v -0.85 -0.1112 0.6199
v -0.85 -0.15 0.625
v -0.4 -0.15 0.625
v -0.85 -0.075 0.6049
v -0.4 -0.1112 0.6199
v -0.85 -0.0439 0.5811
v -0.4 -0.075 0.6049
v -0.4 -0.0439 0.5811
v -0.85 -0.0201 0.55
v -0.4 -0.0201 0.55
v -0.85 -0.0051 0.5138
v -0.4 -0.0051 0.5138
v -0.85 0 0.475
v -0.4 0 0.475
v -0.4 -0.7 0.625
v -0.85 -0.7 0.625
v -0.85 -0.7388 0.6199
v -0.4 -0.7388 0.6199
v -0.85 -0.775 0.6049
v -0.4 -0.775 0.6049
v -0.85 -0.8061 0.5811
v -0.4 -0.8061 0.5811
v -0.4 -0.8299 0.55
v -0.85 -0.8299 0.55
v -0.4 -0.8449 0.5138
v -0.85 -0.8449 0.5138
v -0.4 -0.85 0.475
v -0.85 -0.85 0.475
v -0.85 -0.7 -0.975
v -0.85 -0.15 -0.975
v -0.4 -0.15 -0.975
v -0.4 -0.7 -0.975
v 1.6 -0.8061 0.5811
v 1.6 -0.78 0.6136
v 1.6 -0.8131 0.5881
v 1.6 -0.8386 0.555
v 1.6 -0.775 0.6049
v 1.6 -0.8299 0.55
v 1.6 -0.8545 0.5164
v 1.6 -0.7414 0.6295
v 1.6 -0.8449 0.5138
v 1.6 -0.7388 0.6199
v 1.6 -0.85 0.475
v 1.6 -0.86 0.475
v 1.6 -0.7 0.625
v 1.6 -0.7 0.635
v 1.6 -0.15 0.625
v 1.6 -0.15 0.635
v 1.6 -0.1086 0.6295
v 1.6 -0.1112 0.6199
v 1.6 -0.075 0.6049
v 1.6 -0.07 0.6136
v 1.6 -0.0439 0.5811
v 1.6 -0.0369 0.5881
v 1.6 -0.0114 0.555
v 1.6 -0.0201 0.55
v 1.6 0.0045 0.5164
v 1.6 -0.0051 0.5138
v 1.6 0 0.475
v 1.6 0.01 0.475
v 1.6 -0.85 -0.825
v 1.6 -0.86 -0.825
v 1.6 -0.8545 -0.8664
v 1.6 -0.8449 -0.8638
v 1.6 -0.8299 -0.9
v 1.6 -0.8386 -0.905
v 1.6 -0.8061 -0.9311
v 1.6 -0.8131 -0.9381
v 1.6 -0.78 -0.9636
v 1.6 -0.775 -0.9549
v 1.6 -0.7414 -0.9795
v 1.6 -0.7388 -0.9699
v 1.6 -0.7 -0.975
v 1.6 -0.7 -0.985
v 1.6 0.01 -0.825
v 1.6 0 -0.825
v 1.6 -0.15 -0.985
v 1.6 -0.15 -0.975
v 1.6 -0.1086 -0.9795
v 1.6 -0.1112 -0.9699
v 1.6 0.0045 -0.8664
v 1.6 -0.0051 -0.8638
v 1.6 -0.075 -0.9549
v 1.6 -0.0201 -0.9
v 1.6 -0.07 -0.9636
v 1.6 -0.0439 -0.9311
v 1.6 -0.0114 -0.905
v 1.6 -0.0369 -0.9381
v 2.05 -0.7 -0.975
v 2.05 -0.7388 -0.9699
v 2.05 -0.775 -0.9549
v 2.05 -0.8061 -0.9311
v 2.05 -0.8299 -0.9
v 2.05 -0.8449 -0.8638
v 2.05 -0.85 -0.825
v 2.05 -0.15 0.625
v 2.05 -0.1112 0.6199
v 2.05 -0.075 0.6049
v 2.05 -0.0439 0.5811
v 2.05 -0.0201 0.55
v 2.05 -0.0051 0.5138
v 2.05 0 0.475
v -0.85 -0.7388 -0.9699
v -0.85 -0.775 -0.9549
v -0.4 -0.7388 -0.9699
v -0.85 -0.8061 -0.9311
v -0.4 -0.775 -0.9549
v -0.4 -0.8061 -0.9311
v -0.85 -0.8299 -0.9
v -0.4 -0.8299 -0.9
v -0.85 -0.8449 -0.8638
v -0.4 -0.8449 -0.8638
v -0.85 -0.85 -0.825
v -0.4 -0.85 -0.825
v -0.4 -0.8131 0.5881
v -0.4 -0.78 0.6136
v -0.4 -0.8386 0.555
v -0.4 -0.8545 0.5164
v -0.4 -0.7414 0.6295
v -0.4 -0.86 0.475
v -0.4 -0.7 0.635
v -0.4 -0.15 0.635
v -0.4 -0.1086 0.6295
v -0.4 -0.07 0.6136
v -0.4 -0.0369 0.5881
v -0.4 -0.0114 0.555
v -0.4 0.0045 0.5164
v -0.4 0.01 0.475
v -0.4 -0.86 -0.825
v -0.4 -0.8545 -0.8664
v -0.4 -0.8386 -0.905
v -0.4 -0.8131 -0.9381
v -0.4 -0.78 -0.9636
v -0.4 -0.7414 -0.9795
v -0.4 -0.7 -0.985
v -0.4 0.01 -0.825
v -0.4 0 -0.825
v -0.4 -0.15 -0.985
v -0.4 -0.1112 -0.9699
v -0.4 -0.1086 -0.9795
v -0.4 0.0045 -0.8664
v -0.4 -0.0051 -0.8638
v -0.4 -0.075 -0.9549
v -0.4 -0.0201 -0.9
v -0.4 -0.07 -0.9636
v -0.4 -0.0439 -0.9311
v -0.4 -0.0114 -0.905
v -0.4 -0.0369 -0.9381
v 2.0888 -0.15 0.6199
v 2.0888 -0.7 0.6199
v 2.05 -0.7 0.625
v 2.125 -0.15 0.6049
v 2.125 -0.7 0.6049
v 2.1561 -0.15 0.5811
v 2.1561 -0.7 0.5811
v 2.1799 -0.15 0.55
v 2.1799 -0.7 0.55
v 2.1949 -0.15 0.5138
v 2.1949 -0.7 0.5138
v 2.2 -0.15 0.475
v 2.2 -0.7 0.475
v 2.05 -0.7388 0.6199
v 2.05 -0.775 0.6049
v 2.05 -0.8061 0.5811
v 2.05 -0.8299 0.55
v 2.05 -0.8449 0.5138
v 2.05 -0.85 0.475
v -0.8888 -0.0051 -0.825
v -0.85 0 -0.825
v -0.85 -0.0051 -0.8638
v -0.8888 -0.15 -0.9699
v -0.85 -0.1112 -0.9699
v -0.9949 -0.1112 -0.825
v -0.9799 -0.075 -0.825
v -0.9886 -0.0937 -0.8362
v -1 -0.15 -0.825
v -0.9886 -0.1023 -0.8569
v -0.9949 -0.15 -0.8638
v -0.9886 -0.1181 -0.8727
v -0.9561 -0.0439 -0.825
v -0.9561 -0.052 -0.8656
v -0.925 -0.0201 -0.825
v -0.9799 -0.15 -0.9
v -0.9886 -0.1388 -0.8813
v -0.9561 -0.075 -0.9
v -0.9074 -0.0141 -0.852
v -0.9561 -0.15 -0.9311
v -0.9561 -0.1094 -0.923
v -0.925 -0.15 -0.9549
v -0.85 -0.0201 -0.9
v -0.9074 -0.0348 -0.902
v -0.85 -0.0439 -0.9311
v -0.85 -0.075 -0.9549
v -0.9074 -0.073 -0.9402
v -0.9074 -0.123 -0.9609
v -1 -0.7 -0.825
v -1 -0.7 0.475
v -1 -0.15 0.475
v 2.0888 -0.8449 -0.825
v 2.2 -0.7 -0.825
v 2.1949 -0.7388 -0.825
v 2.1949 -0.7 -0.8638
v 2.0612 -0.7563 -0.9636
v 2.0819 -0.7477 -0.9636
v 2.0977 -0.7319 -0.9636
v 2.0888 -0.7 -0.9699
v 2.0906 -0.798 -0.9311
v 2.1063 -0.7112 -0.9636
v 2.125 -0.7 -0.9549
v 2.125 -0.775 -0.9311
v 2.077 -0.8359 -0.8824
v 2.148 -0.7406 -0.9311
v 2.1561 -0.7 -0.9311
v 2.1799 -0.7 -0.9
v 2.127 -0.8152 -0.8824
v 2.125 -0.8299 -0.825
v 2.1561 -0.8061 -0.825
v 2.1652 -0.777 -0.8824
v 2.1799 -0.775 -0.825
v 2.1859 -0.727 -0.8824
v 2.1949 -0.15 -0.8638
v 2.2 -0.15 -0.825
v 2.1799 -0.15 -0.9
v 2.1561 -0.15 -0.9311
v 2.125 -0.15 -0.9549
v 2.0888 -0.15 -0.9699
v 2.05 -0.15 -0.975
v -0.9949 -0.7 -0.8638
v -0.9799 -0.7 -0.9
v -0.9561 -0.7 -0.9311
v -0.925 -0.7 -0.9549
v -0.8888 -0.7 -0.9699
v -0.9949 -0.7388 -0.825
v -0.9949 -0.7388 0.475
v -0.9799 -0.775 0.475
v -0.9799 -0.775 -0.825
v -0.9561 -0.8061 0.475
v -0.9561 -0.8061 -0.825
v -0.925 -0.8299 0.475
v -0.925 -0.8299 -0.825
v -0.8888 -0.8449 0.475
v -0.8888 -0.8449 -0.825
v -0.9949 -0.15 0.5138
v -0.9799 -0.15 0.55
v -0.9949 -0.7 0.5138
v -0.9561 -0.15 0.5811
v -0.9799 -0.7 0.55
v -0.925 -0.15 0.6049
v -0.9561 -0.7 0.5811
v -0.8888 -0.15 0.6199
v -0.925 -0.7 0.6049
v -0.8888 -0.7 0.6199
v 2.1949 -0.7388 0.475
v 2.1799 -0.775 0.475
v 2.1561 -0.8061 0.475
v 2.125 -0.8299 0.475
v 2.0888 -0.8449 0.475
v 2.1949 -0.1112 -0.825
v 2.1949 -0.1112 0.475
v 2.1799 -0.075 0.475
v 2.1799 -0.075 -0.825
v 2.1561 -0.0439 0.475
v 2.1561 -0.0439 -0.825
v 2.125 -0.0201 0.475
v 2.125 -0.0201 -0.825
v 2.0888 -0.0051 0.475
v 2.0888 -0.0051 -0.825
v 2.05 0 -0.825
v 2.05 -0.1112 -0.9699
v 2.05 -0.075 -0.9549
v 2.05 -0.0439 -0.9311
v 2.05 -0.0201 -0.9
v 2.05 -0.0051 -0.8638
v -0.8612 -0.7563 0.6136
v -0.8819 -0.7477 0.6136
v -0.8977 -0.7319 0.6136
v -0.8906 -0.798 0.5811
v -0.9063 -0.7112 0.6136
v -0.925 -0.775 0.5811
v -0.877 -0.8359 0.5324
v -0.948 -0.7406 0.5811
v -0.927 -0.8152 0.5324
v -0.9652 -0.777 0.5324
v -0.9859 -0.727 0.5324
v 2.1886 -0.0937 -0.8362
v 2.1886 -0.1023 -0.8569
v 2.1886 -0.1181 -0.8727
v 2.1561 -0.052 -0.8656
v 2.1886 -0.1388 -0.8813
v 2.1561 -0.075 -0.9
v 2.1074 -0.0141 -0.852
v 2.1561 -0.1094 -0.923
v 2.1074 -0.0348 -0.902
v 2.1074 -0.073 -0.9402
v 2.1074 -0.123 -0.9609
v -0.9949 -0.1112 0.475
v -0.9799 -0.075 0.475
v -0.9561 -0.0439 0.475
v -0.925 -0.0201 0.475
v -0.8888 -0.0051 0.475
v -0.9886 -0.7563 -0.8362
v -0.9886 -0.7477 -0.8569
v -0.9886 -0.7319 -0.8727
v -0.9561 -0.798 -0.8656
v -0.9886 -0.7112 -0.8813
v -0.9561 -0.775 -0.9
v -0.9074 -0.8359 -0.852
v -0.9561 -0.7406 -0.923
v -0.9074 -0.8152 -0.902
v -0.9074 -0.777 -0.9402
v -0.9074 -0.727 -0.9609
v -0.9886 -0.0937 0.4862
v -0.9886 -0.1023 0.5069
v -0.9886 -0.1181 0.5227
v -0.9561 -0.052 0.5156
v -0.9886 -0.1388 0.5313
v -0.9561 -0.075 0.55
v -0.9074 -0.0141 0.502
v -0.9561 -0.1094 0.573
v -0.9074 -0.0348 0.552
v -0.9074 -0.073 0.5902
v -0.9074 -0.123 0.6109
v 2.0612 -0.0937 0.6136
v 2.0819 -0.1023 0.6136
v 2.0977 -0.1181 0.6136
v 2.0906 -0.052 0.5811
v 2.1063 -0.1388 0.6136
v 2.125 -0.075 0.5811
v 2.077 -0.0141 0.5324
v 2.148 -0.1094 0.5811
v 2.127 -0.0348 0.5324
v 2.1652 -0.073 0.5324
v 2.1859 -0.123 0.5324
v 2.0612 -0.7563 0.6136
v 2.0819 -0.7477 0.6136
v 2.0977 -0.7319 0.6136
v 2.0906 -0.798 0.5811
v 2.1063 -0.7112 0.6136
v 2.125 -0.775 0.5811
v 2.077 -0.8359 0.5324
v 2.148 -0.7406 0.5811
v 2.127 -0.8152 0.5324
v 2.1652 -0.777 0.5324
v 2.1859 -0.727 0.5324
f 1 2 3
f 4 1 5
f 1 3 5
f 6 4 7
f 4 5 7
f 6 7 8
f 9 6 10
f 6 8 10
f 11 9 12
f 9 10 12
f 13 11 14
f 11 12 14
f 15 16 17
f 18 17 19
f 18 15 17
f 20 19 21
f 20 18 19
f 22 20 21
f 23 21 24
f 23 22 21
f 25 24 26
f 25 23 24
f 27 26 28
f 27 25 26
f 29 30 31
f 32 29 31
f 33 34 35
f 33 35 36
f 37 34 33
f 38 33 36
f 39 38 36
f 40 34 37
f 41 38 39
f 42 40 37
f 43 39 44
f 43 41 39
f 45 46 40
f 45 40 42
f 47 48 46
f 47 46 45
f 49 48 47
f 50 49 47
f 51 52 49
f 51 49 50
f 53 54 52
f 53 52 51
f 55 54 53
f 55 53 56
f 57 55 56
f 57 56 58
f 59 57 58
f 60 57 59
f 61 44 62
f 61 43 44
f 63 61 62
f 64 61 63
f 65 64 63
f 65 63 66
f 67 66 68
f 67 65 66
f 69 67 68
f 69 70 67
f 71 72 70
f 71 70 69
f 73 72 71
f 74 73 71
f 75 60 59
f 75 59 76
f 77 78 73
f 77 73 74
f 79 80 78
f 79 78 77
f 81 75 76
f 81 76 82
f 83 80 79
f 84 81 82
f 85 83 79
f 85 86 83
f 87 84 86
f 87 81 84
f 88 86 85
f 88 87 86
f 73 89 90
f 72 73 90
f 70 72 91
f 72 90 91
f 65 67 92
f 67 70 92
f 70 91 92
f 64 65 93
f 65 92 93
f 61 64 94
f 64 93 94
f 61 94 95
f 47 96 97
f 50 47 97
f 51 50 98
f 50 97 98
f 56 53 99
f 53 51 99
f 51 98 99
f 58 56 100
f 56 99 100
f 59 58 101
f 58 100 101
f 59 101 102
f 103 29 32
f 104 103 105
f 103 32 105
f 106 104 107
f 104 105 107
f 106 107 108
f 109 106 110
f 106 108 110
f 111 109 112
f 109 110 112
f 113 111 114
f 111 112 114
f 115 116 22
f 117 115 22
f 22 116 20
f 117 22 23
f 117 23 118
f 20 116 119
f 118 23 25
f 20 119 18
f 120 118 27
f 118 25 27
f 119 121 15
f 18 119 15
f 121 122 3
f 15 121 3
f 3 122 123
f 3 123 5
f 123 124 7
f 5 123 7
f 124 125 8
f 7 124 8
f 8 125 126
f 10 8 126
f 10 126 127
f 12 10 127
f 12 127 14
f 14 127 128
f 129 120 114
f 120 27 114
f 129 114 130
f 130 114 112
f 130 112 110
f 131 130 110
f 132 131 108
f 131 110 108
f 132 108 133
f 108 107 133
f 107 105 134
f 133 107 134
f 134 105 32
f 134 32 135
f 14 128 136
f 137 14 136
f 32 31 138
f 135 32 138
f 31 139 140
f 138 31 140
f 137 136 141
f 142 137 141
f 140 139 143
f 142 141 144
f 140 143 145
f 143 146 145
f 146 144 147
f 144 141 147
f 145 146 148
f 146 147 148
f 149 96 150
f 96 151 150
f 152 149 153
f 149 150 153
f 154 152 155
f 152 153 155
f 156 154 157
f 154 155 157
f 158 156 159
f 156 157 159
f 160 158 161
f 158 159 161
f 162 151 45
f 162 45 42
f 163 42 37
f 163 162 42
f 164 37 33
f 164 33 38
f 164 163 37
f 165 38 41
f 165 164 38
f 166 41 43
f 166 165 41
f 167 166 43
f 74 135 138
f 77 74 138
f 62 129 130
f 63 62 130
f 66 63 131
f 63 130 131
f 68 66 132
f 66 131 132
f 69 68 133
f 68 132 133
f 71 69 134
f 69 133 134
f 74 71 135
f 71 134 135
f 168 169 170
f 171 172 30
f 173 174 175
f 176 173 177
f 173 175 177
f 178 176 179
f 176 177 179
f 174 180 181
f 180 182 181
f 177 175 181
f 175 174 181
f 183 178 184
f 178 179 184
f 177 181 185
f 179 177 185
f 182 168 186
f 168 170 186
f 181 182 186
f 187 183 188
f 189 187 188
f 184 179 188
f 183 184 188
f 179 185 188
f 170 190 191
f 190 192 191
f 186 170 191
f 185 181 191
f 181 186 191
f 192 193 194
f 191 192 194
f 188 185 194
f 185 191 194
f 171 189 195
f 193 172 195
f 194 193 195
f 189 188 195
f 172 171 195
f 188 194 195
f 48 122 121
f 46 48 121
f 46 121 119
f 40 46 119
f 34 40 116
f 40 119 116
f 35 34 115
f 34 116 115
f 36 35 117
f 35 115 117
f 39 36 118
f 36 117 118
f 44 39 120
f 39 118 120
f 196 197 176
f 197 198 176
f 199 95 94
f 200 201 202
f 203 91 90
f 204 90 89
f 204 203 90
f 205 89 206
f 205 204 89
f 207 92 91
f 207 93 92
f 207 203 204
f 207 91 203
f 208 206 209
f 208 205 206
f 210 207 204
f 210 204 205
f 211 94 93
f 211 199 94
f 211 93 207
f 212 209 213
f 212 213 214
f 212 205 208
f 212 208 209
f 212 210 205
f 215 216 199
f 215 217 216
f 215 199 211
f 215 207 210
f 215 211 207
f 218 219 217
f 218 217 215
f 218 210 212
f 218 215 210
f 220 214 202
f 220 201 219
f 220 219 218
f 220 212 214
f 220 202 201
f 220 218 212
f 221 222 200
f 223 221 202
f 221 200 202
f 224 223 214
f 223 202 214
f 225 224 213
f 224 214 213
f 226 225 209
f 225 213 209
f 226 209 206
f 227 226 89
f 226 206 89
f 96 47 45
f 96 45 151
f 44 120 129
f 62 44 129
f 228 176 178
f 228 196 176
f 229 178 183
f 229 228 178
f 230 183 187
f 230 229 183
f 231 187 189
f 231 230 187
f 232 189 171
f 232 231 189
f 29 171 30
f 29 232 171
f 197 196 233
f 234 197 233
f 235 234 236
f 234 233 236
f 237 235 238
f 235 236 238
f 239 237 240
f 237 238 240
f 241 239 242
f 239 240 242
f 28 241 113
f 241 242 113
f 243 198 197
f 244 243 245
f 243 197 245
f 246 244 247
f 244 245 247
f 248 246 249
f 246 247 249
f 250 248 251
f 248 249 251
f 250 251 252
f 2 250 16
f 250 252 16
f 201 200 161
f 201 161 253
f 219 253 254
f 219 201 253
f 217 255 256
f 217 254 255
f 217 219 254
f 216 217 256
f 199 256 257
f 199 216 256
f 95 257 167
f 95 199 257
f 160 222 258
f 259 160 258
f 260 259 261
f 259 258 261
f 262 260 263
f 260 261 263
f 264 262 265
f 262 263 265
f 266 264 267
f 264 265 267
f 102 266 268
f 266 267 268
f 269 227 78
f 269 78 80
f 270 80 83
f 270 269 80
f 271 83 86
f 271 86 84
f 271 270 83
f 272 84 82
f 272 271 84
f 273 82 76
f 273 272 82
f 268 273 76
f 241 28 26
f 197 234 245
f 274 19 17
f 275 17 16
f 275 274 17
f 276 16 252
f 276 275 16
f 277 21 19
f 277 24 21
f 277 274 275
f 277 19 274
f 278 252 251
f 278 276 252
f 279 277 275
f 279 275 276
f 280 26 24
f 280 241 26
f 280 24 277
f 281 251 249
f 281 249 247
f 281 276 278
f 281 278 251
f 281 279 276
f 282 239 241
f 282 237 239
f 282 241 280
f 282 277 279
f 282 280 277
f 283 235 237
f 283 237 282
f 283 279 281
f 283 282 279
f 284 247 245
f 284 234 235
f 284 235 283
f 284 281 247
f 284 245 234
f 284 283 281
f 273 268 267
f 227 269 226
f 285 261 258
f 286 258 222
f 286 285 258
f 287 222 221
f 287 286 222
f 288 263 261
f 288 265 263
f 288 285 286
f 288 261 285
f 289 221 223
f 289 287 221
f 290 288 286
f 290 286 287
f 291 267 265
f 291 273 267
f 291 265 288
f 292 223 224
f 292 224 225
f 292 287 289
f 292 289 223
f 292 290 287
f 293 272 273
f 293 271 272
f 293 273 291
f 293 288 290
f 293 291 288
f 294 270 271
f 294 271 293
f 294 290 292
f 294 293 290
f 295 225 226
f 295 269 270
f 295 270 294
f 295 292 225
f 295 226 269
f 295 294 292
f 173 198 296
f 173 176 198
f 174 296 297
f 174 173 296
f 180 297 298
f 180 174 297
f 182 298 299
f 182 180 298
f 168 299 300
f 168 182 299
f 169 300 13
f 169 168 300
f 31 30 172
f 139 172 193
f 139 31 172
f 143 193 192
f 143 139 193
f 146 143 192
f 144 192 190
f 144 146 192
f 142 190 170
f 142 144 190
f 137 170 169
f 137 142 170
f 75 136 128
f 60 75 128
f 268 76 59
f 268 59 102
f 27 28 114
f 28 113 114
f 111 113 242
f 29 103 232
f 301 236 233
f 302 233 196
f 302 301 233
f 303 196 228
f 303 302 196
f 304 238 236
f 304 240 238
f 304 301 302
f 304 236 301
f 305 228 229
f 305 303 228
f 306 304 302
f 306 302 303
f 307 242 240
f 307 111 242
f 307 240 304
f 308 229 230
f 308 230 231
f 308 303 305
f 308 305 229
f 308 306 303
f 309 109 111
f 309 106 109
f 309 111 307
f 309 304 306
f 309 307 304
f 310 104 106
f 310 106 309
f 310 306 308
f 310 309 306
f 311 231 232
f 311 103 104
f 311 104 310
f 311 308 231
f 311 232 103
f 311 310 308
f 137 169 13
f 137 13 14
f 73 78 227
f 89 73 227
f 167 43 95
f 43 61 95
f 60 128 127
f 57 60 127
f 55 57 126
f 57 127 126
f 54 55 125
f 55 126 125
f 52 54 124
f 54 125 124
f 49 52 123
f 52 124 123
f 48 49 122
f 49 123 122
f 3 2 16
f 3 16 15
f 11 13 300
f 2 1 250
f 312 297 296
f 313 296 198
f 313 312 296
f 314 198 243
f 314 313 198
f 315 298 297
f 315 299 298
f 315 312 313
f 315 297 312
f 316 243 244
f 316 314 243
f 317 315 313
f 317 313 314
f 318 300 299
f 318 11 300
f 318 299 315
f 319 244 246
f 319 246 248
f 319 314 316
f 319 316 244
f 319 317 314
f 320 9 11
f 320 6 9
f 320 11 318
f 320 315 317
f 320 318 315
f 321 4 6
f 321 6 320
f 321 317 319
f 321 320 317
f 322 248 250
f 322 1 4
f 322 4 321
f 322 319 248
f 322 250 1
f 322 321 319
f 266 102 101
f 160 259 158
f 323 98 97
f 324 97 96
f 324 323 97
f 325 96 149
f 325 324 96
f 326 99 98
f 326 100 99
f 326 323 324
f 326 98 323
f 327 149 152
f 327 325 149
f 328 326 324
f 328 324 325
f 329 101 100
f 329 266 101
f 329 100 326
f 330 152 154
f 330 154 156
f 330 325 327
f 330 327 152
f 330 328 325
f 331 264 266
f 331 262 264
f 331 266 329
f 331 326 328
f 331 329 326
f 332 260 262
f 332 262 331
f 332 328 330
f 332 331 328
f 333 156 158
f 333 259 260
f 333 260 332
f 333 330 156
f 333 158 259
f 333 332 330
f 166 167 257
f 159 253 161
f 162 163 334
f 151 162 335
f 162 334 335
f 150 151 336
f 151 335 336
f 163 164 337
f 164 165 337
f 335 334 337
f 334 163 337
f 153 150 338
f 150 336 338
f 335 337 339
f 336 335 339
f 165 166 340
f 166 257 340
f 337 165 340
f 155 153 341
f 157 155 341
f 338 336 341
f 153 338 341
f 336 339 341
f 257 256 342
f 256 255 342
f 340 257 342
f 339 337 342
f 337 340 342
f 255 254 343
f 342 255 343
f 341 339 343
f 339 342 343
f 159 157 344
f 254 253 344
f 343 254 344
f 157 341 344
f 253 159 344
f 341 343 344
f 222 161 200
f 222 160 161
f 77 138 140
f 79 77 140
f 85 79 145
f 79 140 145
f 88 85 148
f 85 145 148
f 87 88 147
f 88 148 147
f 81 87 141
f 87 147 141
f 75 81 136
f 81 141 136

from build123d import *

# Parameters (mm, degrees)
ESBO_O1_W                     = 3.2
ESBO_O1_H                     = 1.6
RESSALTO_EXTRUS_O1_DEPTH      = 0.85
FILETE1_R                     = 0.15
RESSALTO_EXTRUS_O4_DEPTH      = 1
RESSALTO_EXTRUS_O4_DEPTH_BACK = 1


with BuildPart() as part:
    # Esboço1 → Ressalto-extrusão1 (new body)
    with BuildSketch(Plane(origin=(0, 0, 0), x_dir=(1, 0, 0), z_dir=(0, 1, 0))):
        with Locations((0.6, 0.175)):
            Rectangle(ESBO_O1_W, ESBO_O1_H)
    extrude(amount=-RESSALTO_EXTRUS_O1_DEPTH)

    # Filete1
    filete1_edges = [part.edges().sort_by_distance(p)[0] for p in [
        (2.2, -0.85, -0.175),
        (0.6, -0.85, -0.975),
        (-1, -0.85, -0.175),
        (0.6, 0, -0.975),
        (2.2, 0, -0.175),
        (0.6, 0, 0.625),
        (-1, 0, -0.175),
        (0.6, -0.85, 0.625),
        (-1, -0.425, -0.975),
        (2.2, -0.425, -0.975),
        (2.2, -0.425, 0.625),
        (-1, -0.425, 0.625),
    ]]
    fillet(filete1_edges, radius=FILETE1_R)

    # Esboço4 → Ressalto-extrusão4 (add, two sides: drawn at the far end of the back side and taken through both)
    with BuildSketch(Plane(origin=(0.6, 0, 0), x_dir=(0, 0, -1), z_dir=(1, 0, 0)).offset(-RESSALTO_EXTRUS_O4_DEPTH_BACK)):
        with BuildLine():
            Line((0.985, -0.7), (0.985, -0.15))
            ThreePointArc((0.985, -0.15), (0.938137085, -0.036862915), (0.825, 0.01))
            Line((0.825, 0.01), (-0.475, 0.01))
            ThreePointArc((-0.475, 0.01), (-0.588137085, -0.036862915), (-0.635, -0.15))
            Line((-0.635, -0.15), (-0.635, -0.7))
            ThreePointArc((-0.635, -0.7), (-0.588137085, -0.813137085), (-0.475, -0.86))
            Line((-0.475, -0.86), (0.825, -0.86))
            ThreePointArc((0.825, -0.86), (0.938137085, -0.813137085), (0.985, -0.7))
        make_face()
        with BuildLine():
            Line((0.975, -0.7), (0.975, -0.15))
            ThreePointArc((0.975, -0.15), (0.931066017, -0.043933983), (0.825, 0))
            Line((0.825, 0), (-0.475, 0))
            ThreePointArc((-0.475, 0), (-0.581066017, -0.043933983), (-0.625, -0.15))
            Line((-0.625, -0.15), (-0.625, -0.7))
            ThreePointArc((-0.625, -0.7), (-0.581066017, -0.806066017), (-0.475, -0.85))
            Line((-0.475, -0.85), (0.825, -0.85))
            ThreePointArc((0.825, -0.85), (0.931066017, -0.806066017), (0.975, -0.7))
        make_face(mode=Mode.SUBTRACT)
    extrude(amount=RESSALTO_EXTRUS_O4_DEPTH + RESSALTO_EXTRUS_O4_DEPTH_BACK)


solid = part.part
